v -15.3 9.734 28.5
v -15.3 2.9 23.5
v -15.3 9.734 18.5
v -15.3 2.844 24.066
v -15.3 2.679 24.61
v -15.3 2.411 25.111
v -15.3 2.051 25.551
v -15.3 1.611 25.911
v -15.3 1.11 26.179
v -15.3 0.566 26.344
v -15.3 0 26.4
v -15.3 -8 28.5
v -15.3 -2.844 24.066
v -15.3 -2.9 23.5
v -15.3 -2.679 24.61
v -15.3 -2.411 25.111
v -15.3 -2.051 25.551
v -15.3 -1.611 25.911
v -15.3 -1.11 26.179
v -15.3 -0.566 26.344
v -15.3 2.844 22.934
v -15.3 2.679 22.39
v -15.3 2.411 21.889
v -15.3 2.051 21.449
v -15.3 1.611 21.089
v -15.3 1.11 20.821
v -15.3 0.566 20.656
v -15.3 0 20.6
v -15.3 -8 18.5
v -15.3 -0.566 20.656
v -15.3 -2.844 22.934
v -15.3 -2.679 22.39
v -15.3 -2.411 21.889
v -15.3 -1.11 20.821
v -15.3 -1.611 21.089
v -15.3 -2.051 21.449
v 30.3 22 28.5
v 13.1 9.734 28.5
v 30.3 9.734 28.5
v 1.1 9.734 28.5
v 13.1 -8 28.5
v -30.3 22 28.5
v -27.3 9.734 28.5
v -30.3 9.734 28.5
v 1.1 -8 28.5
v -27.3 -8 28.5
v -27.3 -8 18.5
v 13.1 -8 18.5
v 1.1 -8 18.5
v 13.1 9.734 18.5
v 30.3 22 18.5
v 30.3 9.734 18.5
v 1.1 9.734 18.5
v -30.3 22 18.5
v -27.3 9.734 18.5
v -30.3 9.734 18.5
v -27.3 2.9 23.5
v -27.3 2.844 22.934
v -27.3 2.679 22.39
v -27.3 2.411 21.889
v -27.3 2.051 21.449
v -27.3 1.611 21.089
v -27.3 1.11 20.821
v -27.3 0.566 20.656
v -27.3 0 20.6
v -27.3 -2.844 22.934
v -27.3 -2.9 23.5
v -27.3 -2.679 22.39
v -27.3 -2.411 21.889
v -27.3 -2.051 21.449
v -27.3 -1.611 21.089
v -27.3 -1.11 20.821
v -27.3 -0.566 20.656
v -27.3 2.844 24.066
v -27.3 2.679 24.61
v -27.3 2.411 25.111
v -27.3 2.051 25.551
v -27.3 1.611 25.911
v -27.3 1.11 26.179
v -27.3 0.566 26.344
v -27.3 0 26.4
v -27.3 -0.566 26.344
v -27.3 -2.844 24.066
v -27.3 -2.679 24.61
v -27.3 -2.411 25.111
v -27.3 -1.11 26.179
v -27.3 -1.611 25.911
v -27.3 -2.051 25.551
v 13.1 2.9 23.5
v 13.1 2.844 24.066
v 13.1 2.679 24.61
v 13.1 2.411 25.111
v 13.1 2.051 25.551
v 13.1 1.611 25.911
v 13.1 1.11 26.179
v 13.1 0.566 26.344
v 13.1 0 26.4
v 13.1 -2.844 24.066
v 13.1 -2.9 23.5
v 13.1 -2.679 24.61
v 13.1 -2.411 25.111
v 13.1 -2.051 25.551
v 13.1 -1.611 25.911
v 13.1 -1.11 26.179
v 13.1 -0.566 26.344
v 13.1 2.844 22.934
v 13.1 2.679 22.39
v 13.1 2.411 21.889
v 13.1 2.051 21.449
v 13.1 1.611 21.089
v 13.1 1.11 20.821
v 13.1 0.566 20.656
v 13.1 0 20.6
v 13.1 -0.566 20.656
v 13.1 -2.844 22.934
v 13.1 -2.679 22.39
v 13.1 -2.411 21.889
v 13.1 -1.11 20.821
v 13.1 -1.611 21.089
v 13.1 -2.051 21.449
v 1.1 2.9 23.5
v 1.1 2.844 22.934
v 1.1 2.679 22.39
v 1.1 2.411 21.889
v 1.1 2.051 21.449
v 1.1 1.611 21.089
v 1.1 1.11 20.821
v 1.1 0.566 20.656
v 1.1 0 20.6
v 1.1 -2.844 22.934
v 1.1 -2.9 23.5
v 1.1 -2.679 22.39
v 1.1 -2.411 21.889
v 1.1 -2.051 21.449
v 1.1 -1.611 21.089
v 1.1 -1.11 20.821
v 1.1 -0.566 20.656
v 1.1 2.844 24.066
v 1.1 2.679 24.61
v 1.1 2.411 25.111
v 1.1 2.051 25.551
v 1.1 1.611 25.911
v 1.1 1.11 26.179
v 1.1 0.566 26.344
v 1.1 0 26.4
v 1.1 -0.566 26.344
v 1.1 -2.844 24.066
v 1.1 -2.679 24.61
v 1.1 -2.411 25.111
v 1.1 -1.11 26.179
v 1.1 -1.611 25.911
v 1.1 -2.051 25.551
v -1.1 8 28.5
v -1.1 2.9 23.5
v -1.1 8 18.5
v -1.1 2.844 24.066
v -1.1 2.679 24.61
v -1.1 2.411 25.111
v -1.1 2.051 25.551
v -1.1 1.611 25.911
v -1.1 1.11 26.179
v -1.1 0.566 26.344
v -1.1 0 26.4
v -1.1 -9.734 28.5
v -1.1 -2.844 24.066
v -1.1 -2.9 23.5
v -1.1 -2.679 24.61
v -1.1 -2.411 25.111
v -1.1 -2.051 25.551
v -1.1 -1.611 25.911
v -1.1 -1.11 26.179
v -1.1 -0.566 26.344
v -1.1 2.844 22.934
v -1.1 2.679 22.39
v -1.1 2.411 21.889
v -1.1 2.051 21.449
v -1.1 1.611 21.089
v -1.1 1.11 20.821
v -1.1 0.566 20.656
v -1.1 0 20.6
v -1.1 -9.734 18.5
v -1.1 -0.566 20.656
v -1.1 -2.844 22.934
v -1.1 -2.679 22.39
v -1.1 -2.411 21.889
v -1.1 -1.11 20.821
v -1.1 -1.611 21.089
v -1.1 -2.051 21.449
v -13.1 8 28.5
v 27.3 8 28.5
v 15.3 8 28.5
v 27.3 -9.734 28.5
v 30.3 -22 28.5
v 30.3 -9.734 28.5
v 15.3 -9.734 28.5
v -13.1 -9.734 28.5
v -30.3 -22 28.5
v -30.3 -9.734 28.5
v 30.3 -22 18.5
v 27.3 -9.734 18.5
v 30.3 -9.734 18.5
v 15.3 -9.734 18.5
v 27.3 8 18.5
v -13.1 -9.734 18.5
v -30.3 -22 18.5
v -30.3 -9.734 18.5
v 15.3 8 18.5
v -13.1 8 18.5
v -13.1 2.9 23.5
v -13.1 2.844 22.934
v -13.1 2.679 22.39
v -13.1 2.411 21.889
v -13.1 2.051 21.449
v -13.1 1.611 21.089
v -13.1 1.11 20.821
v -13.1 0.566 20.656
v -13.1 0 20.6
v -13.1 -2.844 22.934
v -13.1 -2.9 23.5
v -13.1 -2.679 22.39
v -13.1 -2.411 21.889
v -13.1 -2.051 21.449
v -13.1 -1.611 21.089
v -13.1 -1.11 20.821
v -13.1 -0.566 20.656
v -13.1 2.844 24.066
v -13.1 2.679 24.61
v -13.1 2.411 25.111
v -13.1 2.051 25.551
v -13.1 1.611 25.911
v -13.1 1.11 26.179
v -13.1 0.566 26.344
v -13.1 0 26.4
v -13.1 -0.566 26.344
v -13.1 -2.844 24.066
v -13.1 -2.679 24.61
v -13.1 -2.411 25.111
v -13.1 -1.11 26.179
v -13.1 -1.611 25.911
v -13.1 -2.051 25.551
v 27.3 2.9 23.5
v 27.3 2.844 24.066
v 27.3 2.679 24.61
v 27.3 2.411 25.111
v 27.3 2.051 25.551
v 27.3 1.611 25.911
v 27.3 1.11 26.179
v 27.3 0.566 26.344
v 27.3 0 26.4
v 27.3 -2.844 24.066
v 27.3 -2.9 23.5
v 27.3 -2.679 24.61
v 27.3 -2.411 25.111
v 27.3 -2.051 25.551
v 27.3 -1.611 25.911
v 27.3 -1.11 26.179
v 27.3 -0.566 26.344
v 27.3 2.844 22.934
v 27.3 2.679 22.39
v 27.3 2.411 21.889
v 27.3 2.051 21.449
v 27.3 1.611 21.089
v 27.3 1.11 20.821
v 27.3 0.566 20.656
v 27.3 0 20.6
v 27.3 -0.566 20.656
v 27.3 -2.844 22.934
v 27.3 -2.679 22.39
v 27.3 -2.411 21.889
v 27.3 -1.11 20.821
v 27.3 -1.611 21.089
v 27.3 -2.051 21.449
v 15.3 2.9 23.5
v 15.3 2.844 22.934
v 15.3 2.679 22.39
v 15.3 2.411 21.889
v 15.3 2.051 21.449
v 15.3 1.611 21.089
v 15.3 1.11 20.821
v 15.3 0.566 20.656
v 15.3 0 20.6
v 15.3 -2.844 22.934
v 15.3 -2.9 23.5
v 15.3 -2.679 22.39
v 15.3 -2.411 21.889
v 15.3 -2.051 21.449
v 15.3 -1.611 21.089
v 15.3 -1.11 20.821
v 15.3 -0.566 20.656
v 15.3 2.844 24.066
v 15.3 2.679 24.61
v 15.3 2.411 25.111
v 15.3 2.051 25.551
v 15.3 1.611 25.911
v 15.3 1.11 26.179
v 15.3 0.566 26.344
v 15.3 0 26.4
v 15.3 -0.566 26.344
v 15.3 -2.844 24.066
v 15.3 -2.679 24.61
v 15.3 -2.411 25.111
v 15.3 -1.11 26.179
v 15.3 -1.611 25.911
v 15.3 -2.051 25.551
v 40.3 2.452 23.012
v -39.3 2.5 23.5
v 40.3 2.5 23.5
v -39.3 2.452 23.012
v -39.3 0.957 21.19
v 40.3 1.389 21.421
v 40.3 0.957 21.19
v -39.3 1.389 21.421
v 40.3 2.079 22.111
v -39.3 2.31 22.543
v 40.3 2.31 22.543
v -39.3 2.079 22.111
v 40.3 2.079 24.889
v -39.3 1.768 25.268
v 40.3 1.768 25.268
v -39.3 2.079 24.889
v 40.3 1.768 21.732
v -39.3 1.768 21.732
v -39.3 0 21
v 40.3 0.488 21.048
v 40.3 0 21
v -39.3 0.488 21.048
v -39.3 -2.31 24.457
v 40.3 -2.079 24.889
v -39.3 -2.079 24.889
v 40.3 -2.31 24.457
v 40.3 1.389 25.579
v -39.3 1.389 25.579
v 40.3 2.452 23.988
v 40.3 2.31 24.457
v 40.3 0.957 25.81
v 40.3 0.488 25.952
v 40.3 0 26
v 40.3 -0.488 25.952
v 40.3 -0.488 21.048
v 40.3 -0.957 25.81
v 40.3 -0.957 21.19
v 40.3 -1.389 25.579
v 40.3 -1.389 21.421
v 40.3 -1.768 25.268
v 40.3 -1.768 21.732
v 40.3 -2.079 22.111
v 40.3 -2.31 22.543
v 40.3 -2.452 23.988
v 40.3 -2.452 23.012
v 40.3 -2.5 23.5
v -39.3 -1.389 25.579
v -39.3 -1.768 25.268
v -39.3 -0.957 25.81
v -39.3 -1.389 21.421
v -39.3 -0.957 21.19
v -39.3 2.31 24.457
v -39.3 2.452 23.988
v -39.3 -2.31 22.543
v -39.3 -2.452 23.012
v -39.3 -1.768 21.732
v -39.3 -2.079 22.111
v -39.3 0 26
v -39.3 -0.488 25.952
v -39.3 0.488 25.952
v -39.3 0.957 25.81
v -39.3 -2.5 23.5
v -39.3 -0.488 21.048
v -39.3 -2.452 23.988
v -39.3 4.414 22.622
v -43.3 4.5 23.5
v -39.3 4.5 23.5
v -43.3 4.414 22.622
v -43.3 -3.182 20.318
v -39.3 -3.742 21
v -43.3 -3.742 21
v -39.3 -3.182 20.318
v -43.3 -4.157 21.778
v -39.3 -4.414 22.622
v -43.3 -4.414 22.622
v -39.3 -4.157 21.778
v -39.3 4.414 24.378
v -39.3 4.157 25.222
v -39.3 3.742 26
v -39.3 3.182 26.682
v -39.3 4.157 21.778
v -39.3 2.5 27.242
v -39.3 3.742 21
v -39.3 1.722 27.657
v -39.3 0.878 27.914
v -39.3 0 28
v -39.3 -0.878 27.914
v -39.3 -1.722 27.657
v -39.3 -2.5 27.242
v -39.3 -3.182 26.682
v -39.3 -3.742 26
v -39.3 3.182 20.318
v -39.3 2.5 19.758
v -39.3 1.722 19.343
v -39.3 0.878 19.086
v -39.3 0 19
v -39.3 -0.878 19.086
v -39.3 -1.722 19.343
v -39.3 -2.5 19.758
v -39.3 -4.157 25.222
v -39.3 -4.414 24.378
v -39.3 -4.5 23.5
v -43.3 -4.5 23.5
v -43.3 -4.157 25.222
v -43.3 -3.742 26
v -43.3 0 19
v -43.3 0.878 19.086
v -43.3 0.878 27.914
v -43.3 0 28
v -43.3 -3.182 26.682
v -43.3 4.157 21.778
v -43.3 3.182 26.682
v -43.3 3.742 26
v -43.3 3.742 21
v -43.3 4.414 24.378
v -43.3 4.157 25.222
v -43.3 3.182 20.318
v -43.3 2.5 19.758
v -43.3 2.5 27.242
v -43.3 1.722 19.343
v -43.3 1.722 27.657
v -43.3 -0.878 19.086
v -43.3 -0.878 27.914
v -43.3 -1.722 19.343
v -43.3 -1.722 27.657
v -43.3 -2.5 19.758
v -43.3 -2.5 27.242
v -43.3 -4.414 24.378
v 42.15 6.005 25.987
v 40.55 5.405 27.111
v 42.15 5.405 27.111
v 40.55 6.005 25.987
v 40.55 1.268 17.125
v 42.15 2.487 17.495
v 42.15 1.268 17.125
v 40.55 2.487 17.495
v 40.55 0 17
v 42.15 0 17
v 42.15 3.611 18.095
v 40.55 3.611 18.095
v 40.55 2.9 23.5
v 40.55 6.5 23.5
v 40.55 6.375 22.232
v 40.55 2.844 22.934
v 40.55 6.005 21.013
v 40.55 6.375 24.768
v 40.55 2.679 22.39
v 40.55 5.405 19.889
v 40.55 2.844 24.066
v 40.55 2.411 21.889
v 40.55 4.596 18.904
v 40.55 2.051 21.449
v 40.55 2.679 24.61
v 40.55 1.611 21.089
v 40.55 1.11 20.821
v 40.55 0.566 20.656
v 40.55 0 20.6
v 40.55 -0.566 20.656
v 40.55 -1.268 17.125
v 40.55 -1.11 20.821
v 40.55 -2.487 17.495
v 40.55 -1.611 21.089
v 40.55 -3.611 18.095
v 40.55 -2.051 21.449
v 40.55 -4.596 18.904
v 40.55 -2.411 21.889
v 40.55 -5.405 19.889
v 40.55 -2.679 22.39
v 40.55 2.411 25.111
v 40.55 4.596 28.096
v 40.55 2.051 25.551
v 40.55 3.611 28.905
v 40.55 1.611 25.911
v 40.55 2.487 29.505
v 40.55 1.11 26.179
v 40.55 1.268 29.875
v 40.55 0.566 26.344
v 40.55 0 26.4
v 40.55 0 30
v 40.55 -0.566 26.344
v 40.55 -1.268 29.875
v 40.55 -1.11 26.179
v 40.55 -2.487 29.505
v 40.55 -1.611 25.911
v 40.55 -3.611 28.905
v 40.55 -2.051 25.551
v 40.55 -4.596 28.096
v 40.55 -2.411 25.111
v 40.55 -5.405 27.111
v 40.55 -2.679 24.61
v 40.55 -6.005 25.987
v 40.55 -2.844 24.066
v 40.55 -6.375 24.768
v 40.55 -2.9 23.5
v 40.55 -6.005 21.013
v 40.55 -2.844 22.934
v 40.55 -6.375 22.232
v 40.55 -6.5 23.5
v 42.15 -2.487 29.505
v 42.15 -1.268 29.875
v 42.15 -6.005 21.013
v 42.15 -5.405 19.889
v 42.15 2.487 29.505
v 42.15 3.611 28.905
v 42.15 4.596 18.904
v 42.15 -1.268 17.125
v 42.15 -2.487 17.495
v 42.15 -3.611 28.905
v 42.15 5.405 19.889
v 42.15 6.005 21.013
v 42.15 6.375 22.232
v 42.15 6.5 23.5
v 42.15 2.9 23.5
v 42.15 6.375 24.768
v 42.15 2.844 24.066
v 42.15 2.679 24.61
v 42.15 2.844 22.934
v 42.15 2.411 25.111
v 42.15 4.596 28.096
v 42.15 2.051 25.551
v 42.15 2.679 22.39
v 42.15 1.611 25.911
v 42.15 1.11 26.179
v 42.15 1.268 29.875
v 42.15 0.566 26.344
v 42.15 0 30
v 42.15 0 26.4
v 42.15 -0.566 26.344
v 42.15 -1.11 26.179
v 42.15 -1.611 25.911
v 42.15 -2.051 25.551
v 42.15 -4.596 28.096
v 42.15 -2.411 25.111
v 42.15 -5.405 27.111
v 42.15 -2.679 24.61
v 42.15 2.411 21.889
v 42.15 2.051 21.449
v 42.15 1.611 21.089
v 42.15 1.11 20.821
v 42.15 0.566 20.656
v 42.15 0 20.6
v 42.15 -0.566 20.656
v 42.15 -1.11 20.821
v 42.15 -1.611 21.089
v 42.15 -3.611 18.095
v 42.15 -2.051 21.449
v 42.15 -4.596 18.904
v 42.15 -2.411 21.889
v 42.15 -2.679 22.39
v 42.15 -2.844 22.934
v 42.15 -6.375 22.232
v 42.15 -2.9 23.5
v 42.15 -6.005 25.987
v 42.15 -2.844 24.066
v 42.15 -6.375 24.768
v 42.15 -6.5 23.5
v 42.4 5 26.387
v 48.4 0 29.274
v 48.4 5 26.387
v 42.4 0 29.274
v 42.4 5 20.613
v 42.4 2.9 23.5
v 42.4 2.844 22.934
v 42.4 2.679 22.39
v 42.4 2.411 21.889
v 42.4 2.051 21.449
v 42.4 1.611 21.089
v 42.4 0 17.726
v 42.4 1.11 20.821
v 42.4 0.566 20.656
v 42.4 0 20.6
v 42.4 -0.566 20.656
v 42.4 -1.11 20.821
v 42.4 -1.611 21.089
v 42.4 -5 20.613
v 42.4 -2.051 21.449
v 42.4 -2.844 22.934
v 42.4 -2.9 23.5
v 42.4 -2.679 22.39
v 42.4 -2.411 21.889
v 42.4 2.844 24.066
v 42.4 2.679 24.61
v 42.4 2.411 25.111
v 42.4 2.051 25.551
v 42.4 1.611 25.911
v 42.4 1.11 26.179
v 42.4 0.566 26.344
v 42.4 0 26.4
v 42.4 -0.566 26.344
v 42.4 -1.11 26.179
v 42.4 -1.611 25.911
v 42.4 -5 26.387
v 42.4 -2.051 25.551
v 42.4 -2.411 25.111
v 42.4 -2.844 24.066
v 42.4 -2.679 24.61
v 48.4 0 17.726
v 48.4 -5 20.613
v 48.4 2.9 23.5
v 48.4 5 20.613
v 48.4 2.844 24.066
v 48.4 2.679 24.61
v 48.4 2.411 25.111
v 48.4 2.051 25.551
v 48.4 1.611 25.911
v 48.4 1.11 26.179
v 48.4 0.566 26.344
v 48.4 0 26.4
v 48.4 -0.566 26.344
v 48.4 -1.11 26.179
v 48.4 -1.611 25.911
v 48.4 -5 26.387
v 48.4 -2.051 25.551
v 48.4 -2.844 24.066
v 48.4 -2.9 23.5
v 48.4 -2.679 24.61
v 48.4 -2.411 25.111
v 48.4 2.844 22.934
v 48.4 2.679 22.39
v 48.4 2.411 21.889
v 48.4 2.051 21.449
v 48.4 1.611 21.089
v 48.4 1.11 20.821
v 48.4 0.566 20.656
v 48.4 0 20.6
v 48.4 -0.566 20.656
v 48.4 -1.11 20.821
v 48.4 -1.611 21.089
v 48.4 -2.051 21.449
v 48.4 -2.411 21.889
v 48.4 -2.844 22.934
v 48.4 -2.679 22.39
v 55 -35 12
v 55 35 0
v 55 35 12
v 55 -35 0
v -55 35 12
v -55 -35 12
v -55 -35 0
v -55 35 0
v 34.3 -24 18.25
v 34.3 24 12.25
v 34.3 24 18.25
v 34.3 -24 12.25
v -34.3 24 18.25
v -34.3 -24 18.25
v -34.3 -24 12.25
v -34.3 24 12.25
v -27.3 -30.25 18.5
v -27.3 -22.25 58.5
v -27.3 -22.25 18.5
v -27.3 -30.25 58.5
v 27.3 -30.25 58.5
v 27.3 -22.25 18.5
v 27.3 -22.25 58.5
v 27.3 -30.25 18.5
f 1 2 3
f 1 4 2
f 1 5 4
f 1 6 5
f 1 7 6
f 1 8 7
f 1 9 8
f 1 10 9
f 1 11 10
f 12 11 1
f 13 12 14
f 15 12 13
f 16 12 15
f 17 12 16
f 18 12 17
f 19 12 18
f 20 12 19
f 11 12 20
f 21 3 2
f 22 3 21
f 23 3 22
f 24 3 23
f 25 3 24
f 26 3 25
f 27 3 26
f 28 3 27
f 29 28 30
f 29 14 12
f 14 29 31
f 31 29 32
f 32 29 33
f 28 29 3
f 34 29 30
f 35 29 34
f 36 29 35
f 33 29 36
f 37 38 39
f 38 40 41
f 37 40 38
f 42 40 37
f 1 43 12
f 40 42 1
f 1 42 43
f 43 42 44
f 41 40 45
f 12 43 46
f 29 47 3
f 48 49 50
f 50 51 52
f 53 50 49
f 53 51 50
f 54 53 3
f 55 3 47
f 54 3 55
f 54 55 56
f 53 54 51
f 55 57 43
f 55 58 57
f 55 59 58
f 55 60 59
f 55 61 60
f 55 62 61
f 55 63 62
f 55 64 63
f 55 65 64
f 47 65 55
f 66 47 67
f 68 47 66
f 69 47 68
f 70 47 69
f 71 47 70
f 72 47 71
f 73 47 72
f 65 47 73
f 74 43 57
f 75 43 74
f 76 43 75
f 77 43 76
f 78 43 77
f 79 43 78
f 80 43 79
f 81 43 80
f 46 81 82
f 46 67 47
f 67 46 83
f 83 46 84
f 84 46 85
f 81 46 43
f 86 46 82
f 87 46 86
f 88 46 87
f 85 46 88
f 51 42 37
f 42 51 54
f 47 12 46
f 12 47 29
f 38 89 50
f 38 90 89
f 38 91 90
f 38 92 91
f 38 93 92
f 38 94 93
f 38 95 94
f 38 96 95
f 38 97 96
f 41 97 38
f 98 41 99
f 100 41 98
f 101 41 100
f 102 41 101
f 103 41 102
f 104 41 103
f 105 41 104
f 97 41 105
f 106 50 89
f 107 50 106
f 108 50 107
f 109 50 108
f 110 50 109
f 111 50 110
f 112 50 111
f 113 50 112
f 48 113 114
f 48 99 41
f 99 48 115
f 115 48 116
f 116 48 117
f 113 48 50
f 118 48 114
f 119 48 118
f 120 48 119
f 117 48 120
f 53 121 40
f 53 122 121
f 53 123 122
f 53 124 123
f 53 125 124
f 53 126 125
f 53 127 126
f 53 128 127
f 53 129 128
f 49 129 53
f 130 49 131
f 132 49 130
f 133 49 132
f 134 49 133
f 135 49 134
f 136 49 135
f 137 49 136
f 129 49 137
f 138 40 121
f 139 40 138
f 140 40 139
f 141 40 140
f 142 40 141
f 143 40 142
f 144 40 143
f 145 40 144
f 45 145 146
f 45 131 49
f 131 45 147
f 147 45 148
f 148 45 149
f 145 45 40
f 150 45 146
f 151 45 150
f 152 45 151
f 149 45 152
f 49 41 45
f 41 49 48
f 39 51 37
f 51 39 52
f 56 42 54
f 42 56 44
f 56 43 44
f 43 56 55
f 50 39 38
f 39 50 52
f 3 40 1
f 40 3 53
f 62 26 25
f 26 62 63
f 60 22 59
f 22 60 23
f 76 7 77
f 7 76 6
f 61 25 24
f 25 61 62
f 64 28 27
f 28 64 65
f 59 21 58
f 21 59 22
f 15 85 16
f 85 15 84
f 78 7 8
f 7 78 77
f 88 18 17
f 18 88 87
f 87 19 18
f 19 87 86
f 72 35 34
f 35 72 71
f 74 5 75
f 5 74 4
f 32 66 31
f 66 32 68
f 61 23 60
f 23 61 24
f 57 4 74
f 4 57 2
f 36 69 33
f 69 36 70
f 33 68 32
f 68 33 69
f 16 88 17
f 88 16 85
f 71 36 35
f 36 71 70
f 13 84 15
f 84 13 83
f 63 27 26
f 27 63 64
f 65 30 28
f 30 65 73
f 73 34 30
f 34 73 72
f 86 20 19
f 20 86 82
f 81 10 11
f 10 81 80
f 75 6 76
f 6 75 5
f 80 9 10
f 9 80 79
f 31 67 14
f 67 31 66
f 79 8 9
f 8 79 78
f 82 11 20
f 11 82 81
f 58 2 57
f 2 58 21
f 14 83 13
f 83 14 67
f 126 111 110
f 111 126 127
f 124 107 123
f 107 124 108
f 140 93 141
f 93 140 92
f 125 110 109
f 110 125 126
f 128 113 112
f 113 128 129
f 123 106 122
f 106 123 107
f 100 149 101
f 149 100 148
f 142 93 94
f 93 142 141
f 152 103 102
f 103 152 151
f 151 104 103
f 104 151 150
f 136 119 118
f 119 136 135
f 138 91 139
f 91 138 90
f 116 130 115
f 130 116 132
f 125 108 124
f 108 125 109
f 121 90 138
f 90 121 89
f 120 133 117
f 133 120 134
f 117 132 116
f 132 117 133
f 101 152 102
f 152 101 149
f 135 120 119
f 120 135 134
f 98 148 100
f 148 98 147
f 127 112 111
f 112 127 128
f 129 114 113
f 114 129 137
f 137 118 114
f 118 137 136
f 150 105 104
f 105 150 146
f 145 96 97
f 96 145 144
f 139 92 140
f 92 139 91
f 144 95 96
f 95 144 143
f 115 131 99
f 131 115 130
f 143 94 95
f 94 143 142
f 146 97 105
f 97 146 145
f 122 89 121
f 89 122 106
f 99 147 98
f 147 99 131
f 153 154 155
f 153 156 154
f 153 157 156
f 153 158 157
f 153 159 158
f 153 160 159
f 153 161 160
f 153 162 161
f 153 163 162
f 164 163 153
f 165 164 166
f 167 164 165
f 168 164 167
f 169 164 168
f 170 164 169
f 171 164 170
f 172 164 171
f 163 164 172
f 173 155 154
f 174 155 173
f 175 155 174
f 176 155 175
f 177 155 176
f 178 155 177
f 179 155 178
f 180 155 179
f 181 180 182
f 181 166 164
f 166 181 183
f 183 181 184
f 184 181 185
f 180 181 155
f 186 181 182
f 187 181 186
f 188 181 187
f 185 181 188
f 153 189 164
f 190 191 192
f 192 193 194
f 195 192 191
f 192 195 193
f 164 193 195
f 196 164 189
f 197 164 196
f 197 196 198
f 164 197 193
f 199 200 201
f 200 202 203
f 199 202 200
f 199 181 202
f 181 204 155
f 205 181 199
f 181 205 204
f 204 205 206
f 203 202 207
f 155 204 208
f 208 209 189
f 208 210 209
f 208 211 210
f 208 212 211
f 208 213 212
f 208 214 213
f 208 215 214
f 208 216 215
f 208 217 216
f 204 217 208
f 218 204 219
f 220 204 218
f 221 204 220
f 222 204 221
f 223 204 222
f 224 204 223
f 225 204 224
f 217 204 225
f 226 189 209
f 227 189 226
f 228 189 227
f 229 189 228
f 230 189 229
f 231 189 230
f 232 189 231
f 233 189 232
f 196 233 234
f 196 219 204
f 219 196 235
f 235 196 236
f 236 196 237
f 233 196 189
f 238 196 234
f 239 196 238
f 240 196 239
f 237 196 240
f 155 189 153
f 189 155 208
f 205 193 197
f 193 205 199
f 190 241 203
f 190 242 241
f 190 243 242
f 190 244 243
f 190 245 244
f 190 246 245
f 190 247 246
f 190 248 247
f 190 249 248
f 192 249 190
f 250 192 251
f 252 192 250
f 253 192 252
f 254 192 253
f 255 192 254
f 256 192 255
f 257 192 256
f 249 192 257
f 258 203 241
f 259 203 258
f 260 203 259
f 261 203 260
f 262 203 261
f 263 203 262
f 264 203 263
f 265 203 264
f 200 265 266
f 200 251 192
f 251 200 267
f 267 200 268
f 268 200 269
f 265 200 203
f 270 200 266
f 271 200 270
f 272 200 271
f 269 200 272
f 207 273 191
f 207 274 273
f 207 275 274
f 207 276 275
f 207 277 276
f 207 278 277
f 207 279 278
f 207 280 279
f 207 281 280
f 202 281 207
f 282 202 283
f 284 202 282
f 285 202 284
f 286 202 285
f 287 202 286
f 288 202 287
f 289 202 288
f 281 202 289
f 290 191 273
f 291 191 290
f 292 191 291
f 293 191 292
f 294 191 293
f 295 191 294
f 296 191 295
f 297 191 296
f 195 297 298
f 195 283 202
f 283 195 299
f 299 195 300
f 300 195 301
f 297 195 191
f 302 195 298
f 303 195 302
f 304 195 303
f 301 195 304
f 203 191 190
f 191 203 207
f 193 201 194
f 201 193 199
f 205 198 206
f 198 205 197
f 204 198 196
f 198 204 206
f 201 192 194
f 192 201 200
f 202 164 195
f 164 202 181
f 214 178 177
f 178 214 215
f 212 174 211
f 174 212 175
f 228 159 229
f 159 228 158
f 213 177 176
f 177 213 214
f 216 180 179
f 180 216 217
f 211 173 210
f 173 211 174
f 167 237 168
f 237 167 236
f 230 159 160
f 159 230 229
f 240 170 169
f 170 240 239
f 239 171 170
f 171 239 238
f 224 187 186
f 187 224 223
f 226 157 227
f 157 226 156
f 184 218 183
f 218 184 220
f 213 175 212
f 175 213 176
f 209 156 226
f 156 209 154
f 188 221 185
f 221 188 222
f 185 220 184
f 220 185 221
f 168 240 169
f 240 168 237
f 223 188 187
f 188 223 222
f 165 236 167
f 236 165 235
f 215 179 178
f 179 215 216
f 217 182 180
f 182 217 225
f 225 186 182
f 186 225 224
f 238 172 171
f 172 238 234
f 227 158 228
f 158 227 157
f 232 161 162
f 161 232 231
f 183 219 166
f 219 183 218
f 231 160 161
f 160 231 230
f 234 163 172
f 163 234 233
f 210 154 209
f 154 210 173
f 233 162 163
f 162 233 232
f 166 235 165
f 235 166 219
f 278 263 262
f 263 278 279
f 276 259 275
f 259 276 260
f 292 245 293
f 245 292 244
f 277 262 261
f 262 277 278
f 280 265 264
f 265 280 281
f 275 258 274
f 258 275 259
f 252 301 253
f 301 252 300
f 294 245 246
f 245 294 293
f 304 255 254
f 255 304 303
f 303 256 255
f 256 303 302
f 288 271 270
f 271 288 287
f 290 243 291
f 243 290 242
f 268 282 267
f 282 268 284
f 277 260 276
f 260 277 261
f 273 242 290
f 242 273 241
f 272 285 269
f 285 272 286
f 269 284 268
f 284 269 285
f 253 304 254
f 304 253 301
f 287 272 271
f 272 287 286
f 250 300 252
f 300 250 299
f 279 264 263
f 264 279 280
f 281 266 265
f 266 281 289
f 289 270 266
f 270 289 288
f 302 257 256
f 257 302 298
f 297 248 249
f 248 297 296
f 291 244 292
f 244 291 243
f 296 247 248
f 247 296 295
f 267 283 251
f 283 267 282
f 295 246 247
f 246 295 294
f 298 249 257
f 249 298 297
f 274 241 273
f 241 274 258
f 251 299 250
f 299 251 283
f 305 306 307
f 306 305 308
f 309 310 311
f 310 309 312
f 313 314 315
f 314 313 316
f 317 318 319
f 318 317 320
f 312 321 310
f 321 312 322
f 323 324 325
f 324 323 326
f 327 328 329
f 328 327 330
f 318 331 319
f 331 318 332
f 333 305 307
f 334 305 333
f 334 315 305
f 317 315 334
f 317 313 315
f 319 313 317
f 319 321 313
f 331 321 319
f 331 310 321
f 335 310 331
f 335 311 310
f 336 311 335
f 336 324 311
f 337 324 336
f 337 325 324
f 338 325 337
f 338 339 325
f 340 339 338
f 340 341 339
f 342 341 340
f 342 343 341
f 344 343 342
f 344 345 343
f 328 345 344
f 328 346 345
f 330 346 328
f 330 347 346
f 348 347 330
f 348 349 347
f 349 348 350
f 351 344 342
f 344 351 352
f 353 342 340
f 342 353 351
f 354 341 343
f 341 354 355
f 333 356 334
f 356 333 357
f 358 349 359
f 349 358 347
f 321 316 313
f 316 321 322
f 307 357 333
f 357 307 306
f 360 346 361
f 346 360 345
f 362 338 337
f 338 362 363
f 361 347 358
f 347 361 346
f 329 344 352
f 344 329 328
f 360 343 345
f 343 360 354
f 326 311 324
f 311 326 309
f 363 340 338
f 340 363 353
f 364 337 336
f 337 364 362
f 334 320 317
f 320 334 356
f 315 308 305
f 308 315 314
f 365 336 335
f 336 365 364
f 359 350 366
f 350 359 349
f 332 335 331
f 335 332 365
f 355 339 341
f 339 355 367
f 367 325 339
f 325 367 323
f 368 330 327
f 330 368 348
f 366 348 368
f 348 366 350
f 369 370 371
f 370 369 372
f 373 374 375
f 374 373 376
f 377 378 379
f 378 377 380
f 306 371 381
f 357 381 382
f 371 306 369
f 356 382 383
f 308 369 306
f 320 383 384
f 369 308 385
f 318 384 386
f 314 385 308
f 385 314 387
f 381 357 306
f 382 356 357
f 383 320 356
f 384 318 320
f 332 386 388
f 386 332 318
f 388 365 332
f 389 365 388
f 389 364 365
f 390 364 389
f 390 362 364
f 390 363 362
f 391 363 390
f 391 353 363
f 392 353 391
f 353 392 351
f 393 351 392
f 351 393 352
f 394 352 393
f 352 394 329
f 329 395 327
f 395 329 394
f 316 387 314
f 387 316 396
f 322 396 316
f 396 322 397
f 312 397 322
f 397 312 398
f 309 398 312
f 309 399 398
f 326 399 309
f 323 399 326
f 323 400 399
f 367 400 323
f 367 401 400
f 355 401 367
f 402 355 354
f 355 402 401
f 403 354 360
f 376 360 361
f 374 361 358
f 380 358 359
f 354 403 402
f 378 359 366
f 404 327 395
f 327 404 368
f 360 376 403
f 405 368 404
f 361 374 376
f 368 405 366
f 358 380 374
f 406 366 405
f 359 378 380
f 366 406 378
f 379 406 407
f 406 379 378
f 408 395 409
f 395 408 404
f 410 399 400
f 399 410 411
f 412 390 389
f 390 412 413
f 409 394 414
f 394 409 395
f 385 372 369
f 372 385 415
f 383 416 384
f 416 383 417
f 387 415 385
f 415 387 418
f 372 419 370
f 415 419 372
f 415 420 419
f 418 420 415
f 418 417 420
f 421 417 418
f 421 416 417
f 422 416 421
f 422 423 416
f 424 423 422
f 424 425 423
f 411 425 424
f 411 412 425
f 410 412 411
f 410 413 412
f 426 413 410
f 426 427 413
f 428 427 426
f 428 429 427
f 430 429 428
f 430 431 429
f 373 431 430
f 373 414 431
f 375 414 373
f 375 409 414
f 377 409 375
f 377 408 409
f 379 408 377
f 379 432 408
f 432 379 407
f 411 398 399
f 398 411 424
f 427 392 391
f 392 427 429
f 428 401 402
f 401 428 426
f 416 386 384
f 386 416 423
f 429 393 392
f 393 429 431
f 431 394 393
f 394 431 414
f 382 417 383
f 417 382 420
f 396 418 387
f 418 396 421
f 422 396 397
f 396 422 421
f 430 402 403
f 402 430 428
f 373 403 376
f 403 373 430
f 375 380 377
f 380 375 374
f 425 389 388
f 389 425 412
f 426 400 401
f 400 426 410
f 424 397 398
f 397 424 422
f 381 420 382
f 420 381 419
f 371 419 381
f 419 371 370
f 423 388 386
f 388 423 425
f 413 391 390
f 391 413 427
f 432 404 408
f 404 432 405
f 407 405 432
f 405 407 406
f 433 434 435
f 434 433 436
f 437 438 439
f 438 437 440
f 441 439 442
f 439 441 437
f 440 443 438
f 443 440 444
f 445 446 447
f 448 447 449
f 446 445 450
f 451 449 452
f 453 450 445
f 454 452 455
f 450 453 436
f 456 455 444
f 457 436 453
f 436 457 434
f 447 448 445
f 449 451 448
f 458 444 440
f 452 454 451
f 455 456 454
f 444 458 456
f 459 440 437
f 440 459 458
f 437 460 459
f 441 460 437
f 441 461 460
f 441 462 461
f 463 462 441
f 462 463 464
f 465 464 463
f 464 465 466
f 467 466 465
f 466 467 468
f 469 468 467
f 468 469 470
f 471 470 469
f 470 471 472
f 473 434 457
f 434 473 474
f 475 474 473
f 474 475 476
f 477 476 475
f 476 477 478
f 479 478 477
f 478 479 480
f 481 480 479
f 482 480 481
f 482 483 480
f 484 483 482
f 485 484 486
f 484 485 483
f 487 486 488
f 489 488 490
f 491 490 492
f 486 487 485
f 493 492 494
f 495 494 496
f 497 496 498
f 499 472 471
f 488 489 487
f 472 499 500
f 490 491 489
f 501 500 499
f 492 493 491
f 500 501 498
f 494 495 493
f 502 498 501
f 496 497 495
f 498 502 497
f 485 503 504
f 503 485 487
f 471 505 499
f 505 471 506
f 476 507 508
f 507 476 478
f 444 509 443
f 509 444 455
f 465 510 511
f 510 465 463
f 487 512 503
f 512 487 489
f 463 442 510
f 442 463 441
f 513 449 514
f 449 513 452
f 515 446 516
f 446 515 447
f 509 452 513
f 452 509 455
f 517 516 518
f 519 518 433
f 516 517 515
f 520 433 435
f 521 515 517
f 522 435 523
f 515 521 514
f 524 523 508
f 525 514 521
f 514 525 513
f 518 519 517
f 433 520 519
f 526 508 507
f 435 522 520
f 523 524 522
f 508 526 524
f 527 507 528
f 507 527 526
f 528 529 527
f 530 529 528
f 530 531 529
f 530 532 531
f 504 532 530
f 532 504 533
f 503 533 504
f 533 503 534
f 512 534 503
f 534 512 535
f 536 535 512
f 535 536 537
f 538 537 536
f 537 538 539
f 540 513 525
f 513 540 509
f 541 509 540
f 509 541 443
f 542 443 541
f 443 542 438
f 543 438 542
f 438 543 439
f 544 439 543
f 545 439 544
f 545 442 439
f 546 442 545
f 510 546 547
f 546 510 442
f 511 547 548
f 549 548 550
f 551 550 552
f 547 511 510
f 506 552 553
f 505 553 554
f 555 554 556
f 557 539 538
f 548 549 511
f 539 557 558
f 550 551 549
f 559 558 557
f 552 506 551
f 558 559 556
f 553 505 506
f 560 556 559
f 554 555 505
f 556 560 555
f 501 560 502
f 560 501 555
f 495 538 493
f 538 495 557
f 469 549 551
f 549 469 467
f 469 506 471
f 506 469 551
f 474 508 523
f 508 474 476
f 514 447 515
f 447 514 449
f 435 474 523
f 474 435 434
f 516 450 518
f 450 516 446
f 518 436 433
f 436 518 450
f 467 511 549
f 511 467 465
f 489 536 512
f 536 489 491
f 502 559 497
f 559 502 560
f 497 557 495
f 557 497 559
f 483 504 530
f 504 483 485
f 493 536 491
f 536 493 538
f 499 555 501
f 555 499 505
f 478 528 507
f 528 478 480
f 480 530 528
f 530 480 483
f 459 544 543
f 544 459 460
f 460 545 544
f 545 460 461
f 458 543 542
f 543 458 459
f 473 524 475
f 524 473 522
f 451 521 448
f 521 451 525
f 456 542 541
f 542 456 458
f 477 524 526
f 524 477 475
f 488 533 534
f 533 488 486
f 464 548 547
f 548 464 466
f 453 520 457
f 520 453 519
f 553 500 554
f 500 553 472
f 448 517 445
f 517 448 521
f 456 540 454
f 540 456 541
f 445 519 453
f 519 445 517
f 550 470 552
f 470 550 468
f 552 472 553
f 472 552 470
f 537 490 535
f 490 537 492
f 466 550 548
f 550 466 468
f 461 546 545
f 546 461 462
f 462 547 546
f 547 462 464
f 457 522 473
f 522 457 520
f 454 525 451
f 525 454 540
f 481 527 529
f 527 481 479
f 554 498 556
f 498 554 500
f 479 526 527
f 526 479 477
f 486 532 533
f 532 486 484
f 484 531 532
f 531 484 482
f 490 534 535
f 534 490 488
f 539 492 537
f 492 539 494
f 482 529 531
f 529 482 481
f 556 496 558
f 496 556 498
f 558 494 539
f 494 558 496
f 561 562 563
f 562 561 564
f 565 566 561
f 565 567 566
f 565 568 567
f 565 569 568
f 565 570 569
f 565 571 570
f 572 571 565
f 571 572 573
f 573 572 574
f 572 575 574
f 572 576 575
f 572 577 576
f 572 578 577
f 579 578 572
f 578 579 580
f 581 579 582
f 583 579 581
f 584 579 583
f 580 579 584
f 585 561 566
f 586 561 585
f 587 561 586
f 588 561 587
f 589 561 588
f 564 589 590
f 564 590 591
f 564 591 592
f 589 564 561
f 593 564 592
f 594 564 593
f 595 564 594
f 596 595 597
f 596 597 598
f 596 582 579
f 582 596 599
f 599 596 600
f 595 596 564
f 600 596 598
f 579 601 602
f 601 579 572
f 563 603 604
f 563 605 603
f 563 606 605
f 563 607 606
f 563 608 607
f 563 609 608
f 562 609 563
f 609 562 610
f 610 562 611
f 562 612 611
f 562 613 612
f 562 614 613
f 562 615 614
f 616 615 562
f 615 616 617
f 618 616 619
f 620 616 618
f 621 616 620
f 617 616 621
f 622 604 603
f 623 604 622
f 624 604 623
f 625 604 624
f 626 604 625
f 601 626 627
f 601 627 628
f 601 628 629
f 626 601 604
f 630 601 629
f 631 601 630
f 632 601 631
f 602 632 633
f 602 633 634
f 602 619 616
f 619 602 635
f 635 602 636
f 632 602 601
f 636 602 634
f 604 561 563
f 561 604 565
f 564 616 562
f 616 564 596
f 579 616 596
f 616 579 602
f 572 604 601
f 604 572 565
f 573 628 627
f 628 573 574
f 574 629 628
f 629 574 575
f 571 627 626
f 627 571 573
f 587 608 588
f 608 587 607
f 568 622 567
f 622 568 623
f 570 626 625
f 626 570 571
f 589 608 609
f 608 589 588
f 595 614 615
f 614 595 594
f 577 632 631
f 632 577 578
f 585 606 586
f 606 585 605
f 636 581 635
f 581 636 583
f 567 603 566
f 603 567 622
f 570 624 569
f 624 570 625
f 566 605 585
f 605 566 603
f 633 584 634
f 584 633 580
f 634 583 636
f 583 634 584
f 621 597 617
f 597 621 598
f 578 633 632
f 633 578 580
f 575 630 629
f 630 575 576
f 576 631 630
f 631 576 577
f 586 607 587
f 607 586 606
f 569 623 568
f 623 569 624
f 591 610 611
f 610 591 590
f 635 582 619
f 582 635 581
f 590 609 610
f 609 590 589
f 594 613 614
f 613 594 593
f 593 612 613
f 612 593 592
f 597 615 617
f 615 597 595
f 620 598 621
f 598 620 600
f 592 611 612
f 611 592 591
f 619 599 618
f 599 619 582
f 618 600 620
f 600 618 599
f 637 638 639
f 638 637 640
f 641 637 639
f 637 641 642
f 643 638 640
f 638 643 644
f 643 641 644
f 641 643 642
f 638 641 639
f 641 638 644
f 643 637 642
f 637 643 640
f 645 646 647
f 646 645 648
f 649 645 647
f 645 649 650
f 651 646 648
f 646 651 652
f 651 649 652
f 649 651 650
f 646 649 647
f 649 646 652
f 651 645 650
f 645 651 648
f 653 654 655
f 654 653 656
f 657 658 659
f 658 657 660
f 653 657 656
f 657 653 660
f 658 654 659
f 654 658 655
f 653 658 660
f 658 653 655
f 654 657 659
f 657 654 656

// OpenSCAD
$fn = 32;

// ------------------------------------------------------------------------
// Comb hinge with flap: leaf 60.6 x 22 mm, pin d5, flap 40 mm
// Every part is its own module, assembly() places every instance.
// ------------------------------------------------------------------------

// --- part 1 ---
module hinge_bed() {
  difference() {
    translate([-55, -35, 0]) cube([110, 70, 12]);
  }
}

// --- part 2 ---
module hinge_riser() {
  difference() {
    translate([-34.3, -24, 0]) cube([68.6, 48, 6]);
  }
}

// --- part 3 ---
module hinge_leaf_a() {
  difference() {
    union() {
      translate([-27.3, -8, -5]) cube([12, 30, 10]);
      translate([1.1, -8, -5]) cube([12, 30, 10]);
      translate([-30.3, 9.734, -5]) cube([60.6, 12.266, 10]);
    }
    translate([-21.3, 0, 0]) rotate([0, 90, 0]) cylinder(h = 14, d = 5.8, center = true);
    translate([7.1, 0, 0]) rotate([0, 90, 0]) cylinder(h = 14, d = 5.8, center = true);
  }
}

// --- part 4 ---
module hinge_leaf_b() {
  difference() {
    union() {
      translate([-13.1, -22, -5]) cube([12, 30, 10]);
      translate([15.3, -22, -5]) cube([12, 30, 10]);
      translate([-30.3, -22, -5]) cube([60.6, 12.266, 10]);
    }
    translate([-7.1, 0, 0]) rotate([0, 90, 0]) cylinder(h = 14, d = 5.8, center = true);
    translate([21.3, 0, 0]) rotate([0, 90, 0]) cylinder(h = 14, d = 5.8, center = true);
  }
}

// --- part 5 ---
module hinge_flap() {
  difference() {
    translate([-27.3, -20, 0]) cube([54.6, 40, 8]);
  }
}

// --- part 6 ---
module hinge_pin() {
  rotate([0, 90, 0]) cylinder(h = 80.6, d = 5, center = true);
  translate([-43.3, 0, 0]) rotate([0, 90, 0]) cylinder(h = 4, d = 9);
}

// --- part 7 ---
module pin_washer() {
  difference() {
      translate([0, 0, 0]) cylinder(h = 1.6, d = 13);
      translate([0, 0, -1]) cylinder(h = 3.6, d = 5.8);
    }
}

// --- part 8 ---
module pin_nut() {
  difference() {
    linear_extrude(height = 6) polygon(points = [[5.774, 0], [2.887, 5], [-2.887, 5], [-5.774, 0], [-2.887, -5], [2.887, -5]]);
    translate([0, 0, -1]) cylinder(h = 8, d = 5.8);
  }
}

// --- assembly ---
module assembly() {
  color([0.80, 0.24, 0.20]) translate([0, 0, 0]) rotate([0, 0, 0]) hinge_bed();
  color([0.20, 0.45, 0.75]) translate([0, 0, 12.25]) rotate([0, 0, 0]) hinge_riser();
  color([0.25, 0.62, 0.32]) translate([0, 0, 23.5]) rotate([0, 0, 0]) hinge_leaf_a();
  color([0.92, 0.70, 0.18]) translate([0, 0, 23.5]) rotate([0, 0, 0]) hinge_leaf_b();
  color([0.58, 0.35, 0.70]) translate([0, -22.25, 38.5]) rotate([90, 0, 0]) hinge_flap();
  color([0.16, 0.66, 0.66]) translate([0, 0, 23.5]) rotate([0, 0, 0]) hinge_pin();
  color([0.85, 0.48, 0.18]) translate([40.55, 0, 23.5]) rotate([0, 90, 0]) pin_washer();
  color([0.55, 0.60, 0.65]) translate([42.4, 0, 23.5]) rotate([0, 90, 0]) pin_nut();
}

assembly();
